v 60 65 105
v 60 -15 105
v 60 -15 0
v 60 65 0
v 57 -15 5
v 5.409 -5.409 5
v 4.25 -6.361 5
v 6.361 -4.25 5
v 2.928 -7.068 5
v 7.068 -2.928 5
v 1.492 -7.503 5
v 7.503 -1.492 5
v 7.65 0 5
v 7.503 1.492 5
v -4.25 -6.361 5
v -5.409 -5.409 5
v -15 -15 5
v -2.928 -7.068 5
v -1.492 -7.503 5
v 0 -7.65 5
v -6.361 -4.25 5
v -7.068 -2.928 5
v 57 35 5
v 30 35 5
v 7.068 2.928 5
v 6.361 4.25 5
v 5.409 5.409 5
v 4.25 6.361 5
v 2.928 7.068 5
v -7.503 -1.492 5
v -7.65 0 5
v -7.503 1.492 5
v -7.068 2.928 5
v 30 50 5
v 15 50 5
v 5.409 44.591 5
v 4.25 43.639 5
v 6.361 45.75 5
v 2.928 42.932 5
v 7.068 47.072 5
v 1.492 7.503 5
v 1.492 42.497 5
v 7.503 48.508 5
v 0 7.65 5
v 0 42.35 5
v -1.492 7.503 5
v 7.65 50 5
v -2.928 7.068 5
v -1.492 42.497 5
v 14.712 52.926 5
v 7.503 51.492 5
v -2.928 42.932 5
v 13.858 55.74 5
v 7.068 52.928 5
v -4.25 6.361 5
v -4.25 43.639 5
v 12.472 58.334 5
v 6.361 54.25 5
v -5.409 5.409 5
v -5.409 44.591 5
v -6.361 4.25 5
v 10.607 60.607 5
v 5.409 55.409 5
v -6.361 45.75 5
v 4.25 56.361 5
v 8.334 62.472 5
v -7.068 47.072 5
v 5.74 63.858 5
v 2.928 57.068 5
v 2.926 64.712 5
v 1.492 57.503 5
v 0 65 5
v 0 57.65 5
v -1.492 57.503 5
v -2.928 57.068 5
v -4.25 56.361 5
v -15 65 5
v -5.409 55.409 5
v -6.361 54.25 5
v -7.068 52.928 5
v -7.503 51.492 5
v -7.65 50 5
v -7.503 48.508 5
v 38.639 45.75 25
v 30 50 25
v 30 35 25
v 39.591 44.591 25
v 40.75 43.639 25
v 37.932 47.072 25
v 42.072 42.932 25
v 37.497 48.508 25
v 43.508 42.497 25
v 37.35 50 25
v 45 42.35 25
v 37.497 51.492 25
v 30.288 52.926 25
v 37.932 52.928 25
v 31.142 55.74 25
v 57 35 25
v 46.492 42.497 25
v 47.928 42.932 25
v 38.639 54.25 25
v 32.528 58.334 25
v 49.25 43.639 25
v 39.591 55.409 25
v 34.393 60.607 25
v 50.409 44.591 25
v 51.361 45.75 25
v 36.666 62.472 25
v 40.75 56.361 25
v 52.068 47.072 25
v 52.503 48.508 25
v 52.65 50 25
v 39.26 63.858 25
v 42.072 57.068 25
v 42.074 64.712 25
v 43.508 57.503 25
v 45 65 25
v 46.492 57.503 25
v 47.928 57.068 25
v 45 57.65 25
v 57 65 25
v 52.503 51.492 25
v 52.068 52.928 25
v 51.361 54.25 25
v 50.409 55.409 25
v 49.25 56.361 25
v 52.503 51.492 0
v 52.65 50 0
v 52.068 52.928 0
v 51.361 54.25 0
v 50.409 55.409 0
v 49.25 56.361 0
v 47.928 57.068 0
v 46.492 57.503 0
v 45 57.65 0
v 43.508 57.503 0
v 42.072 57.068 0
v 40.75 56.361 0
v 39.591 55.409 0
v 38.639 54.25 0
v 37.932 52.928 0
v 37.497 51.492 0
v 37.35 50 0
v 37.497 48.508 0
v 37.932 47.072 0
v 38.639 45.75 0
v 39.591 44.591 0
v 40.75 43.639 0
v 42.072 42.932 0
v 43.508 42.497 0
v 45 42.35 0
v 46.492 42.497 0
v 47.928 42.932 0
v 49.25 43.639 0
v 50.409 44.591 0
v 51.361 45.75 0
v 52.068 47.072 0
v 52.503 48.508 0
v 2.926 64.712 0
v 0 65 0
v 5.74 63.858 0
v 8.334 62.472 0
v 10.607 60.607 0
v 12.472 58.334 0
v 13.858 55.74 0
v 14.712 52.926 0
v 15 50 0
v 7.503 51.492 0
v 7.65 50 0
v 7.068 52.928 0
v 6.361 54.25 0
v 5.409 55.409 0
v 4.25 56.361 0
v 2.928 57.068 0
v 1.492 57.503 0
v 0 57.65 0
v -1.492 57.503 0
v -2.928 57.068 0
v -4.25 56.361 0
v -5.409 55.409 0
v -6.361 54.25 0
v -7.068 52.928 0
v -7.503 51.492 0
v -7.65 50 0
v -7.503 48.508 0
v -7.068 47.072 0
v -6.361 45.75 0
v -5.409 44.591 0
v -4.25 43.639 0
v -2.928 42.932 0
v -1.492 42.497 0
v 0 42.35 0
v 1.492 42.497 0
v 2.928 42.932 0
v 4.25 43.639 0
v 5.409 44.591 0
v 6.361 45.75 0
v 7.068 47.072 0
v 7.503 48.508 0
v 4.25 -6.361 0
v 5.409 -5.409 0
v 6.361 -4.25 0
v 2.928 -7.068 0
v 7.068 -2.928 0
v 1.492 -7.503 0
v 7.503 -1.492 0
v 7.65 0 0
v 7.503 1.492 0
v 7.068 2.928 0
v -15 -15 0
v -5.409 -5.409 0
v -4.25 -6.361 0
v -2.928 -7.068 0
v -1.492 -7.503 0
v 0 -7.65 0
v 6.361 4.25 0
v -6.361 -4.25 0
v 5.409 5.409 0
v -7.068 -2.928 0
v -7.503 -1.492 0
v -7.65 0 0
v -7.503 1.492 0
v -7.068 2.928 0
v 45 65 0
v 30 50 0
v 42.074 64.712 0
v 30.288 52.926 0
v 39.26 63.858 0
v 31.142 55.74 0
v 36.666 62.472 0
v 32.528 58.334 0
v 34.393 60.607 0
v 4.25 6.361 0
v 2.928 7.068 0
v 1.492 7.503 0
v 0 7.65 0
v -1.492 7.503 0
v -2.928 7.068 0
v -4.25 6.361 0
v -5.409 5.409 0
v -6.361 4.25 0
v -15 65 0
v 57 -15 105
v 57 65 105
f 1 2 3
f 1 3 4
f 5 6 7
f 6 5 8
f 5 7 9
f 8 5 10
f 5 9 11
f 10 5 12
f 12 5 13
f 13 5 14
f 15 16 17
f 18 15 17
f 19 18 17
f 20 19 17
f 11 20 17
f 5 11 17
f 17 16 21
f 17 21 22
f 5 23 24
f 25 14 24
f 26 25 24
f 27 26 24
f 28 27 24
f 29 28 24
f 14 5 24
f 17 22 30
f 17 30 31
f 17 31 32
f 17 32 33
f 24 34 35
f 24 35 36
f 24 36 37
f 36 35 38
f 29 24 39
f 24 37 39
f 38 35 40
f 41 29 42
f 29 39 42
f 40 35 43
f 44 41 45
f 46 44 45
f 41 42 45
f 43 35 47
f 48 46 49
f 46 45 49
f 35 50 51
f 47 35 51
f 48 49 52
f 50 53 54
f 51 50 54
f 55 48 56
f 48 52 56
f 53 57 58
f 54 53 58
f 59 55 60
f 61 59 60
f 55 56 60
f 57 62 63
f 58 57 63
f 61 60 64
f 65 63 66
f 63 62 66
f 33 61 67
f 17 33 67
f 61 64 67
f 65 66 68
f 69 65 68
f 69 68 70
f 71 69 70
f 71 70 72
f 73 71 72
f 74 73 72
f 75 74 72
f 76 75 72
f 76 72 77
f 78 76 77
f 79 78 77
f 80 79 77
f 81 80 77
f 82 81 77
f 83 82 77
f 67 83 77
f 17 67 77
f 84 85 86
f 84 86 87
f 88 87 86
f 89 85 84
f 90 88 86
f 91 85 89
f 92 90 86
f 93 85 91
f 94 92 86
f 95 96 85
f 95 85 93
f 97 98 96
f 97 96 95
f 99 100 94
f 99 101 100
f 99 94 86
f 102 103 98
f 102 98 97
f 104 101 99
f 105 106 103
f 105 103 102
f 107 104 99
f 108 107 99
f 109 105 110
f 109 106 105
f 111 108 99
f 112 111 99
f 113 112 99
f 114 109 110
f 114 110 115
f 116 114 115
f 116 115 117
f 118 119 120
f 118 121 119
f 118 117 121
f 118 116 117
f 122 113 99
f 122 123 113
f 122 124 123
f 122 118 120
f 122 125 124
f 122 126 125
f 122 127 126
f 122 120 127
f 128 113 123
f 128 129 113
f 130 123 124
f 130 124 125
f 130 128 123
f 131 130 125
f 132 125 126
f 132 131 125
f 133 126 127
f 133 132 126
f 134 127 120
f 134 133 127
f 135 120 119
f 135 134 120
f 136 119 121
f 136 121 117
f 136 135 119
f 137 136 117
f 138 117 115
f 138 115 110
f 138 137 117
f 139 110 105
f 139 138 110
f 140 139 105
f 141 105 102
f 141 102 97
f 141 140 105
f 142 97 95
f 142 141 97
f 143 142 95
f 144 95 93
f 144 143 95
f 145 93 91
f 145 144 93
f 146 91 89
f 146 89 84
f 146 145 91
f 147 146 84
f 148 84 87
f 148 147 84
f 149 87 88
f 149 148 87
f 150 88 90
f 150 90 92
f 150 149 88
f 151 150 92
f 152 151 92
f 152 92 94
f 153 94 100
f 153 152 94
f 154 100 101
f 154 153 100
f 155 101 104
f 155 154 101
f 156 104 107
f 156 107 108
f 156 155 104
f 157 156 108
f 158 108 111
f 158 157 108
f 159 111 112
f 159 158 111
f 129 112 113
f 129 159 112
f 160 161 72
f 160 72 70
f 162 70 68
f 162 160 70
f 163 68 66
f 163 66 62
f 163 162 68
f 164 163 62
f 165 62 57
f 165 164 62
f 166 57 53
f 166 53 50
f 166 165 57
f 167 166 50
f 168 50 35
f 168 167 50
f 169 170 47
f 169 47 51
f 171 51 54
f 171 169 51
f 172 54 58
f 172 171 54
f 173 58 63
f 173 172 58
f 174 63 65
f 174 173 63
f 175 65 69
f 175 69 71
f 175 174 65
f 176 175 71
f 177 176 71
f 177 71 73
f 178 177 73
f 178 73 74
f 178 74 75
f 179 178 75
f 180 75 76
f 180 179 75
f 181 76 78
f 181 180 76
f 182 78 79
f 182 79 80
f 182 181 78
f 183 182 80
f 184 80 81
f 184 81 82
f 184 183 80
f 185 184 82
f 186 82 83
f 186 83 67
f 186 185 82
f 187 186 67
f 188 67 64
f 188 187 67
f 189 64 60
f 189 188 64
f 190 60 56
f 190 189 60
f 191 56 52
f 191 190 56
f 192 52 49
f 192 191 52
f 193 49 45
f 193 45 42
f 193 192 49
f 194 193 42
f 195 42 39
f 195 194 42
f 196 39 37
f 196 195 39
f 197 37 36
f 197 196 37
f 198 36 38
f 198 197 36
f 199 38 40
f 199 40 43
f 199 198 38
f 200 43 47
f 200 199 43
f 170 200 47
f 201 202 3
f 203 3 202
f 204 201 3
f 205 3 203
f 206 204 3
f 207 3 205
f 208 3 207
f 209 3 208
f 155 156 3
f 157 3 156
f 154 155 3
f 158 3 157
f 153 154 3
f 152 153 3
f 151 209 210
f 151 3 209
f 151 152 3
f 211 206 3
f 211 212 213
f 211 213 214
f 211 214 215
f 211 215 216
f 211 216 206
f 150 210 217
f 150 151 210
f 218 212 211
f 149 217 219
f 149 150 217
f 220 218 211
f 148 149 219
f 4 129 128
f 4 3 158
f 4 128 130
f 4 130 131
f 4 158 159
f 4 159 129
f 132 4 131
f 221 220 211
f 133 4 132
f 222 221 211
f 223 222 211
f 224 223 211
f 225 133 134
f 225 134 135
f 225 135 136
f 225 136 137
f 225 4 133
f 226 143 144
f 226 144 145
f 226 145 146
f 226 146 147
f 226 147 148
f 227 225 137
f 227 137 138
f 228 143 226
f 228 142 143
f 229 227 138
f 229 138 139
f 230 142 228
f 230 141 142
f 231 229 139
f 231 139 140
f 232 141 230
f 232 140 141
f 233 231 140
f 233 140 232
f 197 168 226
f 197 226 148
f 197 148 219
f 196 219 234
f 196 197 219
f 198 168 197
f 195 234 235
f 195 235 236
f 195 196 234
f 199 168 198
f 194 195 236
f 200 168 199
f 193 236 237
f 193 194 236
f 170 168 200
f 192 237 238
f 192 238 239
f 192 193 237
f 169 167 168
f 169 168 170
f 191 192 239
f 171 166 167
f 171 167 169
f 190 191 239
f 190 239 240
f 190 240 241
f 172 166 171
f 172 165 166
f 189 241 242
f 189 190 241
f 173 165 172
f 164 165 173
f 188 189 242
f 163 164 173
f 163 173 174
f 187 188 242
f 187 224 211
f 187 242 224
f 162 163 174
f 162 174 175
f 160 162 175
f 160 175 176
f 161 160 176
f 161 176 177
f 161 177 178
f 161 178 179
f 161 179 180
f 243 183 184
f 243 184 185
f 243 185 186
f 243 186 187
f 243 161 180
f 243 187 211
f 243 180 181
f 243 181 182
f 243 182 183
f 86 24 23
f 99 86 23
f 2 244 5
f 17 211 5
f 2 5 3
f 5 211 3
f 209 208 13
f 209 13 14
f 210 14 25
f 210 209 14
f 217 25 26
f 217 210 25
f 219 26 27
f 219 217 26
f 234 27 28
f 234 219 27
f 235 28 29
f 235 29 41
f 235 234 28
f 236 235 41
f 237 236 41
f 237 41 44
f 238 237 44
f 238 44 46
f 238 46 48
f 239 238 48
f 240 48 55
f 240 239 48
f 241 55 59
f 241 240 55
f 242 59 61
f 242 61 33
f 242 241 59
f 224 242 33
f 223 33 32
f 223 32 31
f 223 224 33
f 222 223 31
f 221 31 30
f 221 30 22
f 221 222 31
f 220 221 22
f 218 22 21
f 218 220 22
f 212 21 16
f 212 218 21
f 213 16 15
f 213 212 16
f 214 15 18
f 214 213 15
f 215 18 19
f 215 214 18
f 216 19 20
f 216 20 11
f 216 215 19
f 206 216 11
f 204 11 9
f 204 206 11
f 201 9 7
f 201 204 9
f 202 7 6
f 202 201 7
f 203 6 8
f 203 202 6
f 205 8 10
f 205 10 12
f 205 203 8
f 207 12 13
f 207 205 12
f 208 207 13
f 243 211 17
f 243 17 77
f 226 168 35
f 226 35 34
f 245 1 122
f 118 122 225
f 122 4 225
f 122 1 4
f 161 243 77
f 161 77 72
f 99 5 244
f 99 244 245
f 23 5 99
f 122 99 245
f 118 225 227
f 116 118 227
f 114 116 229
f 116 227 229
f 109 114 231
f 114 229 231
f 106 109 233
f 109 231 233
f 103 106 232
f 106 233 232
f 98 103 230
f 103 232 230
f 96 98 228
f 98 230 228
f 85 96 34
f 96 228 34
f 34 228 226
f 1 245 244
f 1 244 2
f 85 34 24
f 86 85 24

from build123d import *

# Parameters (mm, degrees)
SKETCH1_R           = 7.65
BOSS_EXTRUDE2_DEPTH = 5
SKETCH2_W           = 3
SKETCH2_H           = 80
BOSS_EXTRUDE3_DEPTH = 100
SKETCH3_R           = 7.65
BOSS_EXTRUDE4_DEPTH = 20


with BuildPart() as part:
    # Sketch1 → Boss-Extrude2 (new body)
    with BuildSketch(Plane.XY):
        with BuildLine():
            Line((-15, 65), (0, 65))
            ThreePointArc((0, 65), (10.606601718, 60.606601718), (15, 50))
            Line((15, 50), (30, 50))
            ThreePointArc((30, 50), (34.393398282, 60.606601718), (45, 65))
            Line((45, 65), (60, 65))
            Line((60, 65), (60, 41.966335985))
            Line((60, 41.966335985), (60, -15))
            Line((60, -15), (12.652076701, -15))
            Line((12.652076701, -15), (-15, -15))
            Line((-15, -15), (-15, 65))
        make_face()
        Circle(SKETCH1_R, mode=Mode.SUBTRACT)
        with Locations((45, 50)):
            Circle(SKETCH1_R, mode=Mode.SUBTRACT)
        with Locations((0, 50)):
            Circle(SKETCH1_R, mode=Mode.SUBTRACT)
    extrude(amount=BOSS_EXTRUDE2_DEPTH)

    # Sketch2 → Boss-Extrude3 (add)
    with BuildSketch(Plane.XY.offset(5)):
        with Locations((58.5, 25)):
            Rectangle(SKETCH2_W, SKETCH2_H)
    extrude(amount=BOSS_EXTRUDE3_DEPTH)

    # Sketch3 → Boss-Extrude4 (add)
    with BuildSketch(Plane.XY.offset(5)):
        with BuildLine():
            Line((30, 50), (30, 35))
            Line((30, 35), (57, 35))
            Line((57, 35), (57, 65))
            Line((57, 65), (45, 65))
            ThreePointArc((45, 65), (34.393398282, 60.606601718), (30, 50))
        make_face()
        with Locations((45, 50)):
            Circle(SKETCH3_R, mode=Mode.SUBTRACT)
    extrude(amount=BOSS_EXTRUDE4_DEPTH)


solid = part.part
